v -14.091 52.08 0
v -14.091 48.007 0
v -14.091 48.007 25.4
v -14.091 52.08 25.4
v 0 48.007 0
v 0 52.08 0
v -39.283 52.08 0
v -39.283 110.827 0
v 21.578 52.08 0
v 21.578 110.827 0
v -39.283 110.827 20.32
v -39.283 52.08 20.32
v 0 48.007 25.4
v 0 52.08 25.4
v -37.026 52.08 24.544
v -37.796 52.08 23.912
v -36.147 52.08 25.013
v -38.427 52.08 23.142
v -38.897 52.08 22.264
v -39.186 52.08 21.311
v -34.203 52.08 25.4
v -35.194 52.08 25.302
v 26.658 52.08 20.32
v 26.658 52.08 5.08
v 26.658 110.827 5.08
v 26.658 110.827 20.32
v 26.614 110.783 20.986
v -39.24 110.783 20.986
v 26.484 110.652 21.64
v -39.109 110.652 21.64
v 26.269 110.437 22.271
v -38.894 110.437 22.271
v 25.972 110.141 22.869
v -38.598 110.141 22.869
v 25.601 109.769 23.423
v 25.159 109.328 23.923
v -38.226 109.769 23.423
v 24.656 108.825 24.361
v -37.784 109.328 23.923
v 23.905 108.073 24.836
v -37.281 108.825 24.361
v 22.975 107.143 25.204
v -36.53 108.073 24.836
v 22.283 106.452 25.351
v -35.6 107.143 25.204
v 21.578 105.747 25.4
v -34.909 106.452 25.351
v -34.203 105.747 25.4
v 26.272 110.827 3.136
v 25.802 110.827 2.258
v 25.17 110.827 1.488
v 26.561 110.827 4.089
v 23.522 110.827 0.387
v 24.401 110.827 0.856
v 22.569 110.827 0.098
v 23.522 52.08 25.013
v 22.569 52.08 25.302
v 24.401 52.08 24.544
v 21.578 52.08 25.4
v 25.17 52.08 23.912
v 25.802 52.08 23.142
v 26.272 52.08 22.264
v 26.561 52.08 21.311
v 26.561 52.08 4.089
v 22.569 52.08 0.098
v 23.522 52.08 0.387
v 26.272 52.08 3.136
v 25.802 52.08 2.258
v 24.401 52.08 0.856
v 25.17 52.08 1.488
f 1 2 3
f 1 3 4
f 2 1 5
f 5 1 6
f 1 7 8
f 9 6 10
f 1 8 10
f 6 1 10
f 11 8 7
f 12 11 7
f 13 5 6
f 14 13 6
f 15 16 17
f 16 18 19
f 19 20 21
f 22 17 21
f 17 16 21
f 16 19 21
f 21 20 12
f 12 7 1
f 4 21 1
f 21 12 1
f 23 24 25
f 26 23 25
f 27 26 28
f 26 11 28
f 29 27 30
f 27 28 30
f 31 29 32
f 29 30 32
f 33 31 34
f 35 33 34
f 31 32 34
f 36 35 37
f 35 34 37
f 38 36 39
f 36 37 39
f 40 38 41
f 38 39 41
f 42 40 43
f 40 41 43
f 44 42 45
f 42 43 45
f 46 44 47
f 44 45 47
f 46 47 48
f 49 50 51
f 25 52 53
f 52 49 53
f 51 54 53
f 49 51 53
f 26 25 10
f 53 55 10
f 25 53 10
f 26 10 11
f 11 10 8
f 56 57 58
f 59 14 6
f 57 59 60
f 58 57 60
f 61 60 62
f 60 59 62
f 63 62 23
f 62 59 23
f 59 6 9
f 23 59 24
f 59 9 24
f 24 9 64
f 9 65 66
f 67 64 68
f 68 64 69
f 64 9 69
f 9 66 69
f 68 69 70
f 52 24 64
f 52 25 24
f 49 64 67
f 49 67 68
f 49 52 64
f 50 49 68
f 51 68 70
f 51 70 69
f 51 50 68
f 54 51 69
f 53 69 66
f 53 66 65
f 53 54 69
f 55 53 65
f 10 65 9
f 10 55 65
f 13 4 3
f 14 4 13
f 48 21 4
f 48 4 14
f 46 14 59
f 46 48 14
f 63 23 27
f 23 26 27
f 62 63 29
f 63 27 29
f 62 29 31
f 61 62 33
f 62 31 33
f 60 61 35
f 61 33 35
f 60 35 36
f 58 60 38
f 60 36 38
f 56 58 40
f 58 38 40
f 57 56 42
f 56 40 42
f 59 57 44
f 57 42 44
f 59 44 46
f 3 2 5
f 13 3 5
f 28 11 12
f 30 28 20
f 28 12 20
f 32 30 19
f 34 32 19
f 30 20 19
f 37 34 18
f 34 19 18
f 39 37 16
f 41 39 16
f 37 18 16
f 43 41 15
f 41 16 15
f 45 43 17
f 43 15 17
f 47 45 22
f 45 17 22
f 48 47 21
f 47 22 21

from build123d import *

# Parameters (mm, degrees)
F0_W     = 14.0914916992
F0_H     = 13.3883208036
F0_H_2   = 4.0725544095
F1_DEPTH = 25.4
F2_R     = 5.08


with BuildPart() as f1:
    # F0 (on Top) → F1 (new body)
    with BuildSketch(Plane.XY):
        Polygon((-14.0914916992, 52.0800277591), (-14.0914916992, 65.4683485627), (0, 65.4683485627), (0, 52.0800277591), (26.658244431, 52.0800277591), (26.658244431, 110.8265519142), (-39.2834246159, 110.8265519142), (-39.2834246159, 52.0800277591), align=None)
        with Locations((-7.0457458496, 58.7741881609)):
            Rectangle(F0_W, F0_H)
        with Locations((-7.0457458496, 50.0437505543)):
            Rectangle(F0_W, F0_H_2)
    extrude(amount=F1_DEPTH)

    # F2
    f2_edges = [f1.edges().sort_by_distance(p)[0] for p in [
        (26.658244, 81.45329, 25.4),
        (26.658244, 81.45329, 0),
        (-39.283425, 81.45329, 25.4),
        (-6.31259, 110.826552, 25.4),
    ]]
    fillet(f2_edges, radius=F2_R)


solid = f1.part
